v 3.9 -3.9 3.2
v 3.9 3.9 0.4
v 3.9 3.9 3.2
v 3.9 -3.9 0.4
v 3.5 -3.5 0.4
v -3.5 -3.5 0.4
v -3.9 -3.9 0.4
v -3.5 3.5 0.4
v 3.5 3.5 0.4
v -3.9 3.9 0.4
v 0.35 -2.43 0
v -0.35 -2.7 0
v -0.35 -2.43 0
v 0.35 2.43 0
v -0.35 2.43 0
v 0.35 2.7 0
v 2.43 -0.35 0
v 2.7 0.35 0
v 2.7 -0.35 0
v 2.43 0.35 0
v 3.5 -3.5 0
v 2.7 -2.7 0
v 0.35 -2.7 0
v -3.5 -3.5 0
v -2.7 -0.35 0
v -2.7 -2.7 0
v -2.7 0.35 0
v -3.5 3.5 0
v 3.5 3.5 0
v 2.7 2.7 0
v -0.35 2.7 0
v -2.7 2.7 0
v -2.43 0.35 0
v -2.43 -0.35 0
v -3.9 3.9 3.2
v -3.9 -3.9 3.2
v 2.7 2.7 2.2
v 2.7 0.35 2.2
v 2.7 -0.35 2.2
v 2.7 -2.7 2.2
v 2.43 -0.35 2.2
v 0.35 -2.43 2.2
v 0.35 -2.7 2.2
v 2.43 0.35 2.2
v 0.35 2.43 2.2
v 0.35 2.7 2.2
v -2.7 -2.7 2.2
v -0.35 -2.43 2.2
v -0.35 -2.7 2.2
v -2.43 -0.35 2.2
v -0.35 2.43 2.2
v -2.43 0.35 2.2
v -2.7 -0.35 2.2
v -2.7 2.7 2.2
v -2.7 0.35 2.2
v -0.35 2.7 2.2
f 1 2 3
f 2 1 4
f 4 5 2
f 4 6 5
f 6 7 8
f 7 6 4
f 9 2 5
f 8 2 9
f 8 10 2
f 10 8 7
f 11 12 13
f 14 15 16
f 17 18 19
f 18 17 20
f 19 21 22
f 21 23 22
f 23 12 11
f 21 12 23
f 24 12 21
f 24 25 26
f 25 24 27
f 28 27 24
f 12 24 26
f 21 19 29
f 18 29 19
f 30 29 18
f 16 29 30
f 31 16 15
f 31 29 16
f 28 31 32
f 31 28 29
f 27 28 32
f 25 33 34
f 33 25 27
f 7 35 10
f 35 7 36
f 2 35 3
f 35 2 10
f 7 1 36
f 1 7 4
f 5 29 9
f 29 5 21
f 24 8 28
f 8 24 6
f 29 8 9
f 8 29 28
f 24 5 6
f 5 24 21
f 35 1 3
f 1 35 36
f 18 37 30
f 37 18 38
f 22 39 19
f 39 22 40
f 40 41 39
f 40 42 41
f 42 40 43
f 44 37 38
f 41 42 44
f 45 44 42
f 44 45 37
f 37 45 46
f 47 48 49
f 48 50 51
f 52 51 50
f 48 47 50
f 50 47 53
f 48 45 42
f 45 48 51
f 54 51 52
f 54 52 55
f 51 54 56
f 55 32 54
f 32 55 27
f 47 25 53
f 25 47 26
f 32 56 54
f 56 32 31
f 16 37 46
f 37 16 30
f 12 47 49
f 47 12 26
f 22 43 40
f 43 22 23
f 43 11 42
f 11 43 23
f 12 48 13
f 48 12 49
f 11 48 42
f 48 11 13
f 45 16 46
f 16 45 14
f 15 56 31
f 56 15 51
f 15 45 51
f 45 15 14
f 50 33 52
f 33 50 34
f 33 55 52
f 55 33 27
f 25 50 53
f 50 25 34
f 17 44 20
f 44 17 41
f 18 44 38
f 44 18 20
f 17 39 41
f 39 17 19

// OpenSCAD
use <../LEGO.scad>;

block( width=1, length=1, height=1/3, type="tile" );
